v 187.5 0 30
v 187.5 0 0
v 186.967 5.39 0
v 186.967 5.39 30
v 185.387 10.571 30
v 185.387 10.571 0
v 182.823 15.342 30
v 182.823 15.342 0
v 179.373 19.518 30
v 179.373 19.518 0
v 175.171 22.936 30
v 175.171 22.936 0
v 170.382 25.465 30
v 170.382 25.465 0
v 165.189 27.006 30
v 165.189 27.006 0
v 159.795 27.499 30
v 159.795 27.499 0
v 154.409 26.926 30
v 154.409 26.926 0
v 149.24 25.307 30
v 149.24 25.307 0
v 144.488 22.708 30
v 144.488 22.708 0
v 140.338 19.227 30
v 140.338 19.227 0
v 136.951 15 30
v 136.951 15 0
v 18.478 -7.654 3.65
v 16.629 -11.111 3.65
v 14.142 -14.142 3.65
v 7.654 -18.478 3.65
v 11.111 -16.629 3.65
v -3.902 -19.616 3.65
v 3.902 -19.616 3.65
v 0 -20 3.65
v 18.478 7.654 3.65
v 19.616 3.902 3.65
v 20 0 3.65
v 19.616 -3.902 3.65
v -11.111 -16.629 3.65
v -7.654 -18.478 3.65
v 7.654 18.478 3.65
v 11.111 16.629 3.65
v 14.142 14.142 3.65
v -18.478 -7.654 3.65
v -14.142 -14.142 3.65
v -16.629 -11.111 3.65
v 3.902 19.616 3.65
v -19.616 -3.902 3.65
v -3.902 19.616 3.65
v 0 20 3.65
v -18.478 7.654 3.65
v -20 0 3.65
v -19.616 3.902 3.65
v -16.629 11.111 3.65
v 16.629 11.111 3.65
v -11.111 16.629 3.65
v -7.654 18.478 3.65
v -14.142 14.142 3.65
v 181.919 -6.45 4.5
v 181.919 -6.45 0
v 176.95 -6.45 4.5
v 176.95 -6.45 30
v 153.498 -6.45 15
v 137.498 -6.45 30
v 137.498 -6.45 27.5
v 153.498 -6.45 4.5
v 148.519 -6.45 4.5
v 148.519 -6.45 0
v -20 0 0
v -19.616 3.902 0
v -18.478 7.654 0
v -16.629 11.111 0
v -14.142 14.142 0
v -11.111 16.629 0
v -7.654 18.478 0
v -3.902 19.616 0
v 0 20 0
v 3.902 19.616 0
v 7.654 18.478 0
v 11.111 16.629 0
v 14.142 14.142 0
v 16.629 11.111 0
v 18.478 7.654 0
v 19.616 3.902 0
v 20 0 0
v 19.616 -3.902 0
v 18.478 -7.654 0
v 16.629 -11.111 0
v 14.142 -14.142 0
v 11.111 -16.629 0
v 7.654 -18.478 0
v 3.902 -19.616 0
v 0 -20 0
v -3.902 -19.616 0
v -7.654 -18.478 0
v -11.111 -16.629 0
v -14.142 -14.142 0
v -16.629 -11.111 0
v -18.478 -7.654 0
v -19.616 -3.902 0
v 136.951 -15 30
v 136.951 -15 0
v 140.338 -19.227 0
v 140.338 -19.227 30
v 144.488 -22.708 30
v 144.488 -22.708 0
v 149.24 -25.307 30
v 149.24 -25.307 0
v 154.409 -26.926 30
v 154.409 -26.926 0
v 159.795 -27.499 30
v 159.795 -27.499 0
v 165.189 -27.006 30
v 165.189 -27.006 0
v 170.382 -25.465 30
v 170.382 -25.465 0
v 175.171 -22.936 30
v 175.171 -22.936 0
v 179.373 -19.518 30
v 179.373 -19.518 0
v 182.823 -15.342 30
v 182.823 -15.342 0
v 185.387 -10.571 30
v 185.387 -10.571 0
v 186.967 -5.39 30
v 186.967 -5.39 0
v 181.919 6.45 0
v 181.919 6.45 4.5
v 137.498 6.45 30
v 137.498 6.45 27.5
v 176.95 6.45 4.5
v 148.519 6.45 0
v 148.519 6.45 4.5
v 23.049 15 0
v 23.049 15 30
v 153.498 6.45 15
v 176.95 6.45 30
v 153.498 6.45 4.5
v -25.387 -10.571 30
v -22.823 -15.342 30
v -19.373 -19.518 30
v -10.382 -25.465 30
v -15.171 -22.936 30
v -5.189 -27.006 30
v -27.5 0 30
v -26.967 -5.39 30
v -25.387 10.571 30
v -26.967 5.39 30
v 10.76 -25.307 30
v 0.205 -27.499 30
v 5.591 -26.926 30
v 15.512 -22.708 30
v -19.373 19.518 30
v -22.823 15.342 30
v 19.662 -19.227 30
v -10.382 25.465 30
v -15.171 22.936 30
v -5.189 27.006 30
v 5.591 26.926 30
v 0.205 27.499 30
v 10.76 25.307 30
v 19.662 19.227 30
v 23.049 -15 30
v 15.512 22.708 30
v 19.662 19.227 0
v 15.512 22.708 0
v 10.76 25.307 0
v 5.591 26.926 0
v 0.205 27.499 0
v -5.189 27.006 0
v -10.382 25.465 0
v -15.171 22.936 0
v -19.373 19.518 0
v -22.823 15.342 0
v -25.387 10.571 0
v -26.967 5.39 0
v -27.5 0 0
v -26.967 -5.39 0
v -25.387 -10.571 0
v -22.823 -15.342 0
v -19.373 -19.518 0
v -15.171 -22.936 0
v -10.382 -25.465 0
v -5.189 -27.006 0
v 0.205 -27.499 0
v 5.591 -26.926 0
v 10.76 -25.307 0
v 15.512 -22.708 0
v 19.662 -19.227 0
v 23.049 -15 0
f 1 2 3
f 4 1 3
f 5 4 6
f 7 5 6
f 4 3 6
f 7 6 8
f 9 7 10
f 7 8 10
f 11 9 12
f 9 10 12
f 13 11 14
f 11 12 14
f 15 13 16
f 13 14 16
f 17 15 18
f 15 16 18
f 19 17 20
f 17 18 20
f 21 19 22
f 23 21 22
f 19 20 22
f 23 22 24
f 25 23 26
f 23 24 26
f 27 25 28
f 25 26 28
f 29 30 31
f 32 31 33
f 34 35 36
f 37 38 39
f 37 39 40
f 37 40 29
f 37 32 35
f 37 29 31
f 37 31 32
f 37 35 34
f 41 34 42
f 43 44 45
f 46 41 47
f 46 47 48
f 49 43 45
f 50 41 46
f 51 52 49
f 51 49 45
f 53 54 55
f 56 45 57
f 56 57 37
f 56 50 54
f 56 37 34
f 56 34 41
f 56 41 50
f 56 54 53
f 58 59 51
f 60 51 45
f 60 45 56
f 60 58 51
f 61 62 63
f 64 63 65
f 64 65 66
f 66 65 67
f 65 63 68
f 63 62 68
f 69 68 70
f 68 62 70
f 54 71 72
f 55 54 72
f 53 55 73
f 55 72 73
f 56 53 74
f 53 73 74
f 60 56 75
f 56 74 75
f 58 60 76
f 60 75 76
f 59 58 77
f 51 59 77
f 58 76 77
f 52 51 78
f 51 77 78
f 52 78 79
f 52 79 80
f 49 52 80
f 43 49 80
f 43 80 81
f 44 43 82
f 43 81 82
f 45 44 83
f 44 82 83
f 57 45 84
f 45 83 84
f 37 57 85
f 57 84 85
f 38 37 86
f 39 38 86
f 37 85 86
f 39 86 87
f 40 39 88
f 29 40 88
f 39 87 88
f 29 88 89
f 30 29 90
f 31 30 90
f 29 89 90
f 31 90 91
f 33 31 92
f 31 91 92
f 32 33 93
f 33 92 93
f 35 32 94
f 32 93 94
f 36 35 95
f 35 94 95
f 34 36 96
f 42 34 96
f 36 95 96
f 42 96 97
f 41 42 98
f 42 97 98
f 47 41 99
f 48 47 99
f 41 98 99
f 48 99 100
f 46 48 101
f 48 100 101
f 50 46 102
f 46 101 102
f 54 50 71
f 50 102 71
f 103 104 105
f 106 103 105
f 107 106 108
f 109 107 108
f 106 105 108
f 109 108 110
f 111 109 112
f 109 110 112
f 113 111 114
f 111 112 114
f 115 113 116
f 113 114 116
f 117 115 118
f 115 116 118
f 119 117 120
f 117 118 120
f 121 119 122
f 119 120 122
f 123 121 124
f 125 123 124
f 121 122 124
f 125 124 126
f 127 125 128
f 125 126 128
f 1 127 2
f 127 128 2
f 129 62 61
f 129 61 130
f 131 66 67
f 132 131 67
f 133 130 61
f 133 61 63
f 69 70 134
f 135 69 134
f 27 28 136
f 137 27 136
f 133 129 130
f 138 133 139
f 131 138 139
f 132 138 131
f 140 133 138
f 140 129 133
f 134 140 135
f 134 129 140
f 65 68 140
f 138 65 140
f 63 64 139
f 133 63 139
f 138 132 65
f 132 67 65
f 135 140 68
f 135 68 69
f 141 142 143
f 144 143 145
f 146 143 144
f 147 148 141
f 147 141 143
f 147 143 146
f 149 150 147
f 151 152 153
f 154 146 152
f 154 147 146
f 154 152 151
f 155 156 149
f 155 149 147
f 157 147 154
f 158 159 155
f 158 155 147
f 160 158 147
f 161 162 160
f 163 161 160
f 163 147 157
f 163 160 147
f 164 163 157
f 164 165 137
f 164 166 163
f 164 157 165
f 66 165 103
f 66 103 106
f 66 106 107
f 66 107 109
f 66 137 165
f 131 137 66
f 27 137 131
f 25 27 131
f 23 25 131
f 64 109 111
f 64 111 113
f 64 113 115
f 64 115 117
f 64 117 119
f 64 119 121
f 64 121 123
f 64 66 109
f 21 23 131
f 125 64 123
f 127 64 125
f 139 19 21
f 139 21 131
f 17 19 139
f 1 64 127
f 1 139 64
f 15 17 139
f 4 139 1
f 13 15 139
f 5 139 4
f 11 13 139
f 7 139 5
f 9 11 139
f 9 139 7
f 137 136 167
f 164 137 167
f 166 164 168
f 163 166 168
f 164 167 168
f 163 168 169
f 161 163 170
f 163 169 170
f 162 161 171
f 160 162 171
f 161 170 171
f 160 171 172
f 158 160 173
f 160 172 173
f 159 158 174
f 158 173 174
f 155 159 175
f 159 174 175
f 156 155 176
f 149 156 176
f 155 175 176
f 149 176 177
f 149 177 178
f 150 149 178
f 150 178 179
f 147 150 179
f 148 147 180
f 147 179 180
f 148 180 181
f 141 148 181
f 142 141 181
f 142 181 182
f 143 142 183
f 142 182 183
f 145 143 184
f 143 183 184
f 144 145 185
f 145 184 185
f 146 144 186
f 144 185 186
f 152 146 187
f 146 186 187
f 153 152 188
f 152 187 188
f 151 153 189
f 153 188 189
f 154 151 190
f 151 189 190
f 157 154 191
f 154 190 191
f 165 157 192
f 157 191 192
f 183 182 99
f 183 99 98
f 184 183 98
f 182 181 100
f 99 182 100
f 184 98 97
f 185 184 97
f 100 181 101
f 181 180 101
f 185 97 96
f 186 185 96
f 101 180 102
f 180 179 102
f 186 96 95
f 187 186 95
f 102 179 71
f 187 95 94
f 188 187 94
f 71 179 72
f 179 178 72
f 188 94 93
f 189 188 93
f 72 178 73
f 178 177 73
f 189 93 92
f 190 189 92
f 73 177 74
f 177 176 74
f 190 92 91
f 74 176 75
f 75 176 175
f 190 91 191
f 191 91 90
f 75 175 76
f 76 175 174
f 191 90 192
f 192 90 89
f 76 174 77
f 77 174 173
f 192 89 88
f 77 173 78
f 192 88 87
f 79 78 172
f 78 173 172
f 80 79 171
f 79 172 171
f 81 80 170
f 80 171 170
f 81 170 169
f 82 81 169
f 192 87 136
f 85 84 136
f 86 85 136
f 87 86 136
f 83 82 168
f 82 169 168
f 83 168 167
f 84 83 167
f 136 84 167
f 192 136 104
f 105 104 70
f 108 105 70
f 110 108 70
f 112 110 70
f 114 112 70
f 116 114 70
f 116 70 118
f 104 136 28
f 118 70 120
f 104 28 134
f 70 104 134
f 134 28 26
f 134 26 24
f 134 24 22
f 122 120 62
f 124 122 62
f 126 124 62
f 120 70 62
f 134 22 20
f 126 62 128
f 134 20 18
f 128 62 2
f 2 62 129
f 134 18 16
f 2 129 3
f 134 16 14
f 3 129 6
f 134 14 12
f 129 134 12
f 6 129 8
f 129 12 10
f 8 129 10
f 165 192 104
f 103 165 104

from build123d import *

# Parameters (mm, degrees)
BOSS_EXTRUDE1_DEPTH = 30
SKETCH16_W          = 33.4
SKETCH16_H          = 12.9
CUT_EXTRUDE10_DEPTH = 4.5
SKETCH17_W          = 23.45208563
SKETCH17_H          = 12.9
CUT_EXTRUDE11_DEPTH = 192.865838543
CUT_EXTRUDE13_DEPTH = 6.45
SKETCH19_R          = 20
CUT_EXTRUDE14_DEPTH = 3.65


with BuildPart() as part:
    # Sketch1 → Boss-Extrude1 (new body)
    with BuildSketch(Plane.XY):
        with BuildLine():
            ThreePointArc((187.5, 0), (167.823244805, 26.363741023), (136.951138857, 15))
            Line((136.951138857, 15), (160, 15))
            Line((160, 15), (160, -15))
            Line((160, -15), (136.951138857, -15))
            ThreePointArc((136.951138857, -15), (167.823244805, -26.363741023), (187.5, 0))
        make_face()
        with BuildLine():
            Line((160, 15), (136.951138857, 15))
            ThreePointArc((136.951138857, 15), (132.5, 0), (136.951138857, -15))
            Line((136.951138857, -15), (160, -15))
            Line((160, -15), (160, 15))
        make_face()
        with BuildLine():
            Line((136.951138857, 15), (23.048861143, 15))
            ThreePointArc((23.048861143, 15), (26.363741023, 7.823244805), (27.5, 0))
            ThreePointArc((27.5, 0), (26.363741023, -7.823244805), (23.048861143, -15))
            Line((23.048861143, -15), (136.951138857, -15))
            ThreePointArc((136.951138857, -15), (132.5, 0), (136.951138857, 15))
        make_face()
        with BuildLine():
            ThreePointArc((13.228756555, -15), (-20, 0), (13.228756555, 15))
            Line((13.228756555, 15), (23.048861143, 15))
            ThreePointArc((23.048861143, 15), (-27.5, 0), (23.048861143, -15))
            Line((23.048861143, -15), (13.228756555, -15))
        make_face()
        with BuildLine():
            Line((23.048861143, 15), (13.228756555, 15))
            ThreePointArc((13.228756555, 15), (18.228756555, 8.228756555), (20, 0))
            ThreePointArc((20, 0), (18.228756555, -8.228756555), (13.228756555, -15))
            Line((13.228756555, -15), (23.048861143, -15))
            ThreePointArc((23.048861143, -15), (26.363741023, -7.823244805), (27.5, 0))
            ThreePointArc((27.5, 0), (26.363741023, 7.823244805), (23.048861143, 15))
        make_face()
        with BuildLine():
            Line((0, -15), (0, 15))
            Line((0, 15), (13.228756555, 15))
            ThreePointArc((13.228756555, 15), (-20, 0), (13.228756555, -15))
            Line((13.228756555, -15), (0, -15))
        make_face()
        with BuildLine():
            Line((13.228756555, 15), (0, 15))
            Line((0, 15), (0, -15))
            Line((0, -15), (13.228756555, -15))
            ThreePointArc((13.228756555, -15), (18.228756555, -8.228756555), (20, 0))
            ThreePointArc((20, 0), (18.228756555, 8.228756555), (13.228756555, 15))
        make_face()
    extrude(amount=BOSS_EXTRUDE1_DEPTH)

    # Sketch16 → Cut-Extrude10 (cut)
    with BuildSketch(Plane(origin=(0, 0, 0), x_dir=(-1, 0, 0), z_dir=(0, 0, -1))):
        with Locations((-165.21934279, 0)):
            Rectangle(SKETCH16_W, SKETCH16_H)
    extrude(amount=-CUT_EXTRUDE10_DEPTH, mode=Mode.SUBTRACT)

    # Sketch17 → Cut-Extrude11 (cut, through all)
    with BuildSketch(Plane(origin=(0, 0, 0), x_dir=(-1, 0, 0), z_dir=(0, 0, -1))):
        with Locations((-165.223957185, 0)):
            Rectangle(SKETCH17_W, SKETCH17_H)
    extrude(amount=-CUT_EXTRUDE11_DEPTH, mode=Mode.SUBTRACT)

    # Sketch18 → Cut-Extrude13 (cut, symmetric)
    with BuildSketch(Plane(origin=(0, 0, 0), x_dir=(-1, 0, 0), z_dir=(0, -1, 0))):
        Polygon((-153.49791437, -15), (-153.49791437, -30), (-137.49791437, -30), (-137.49791437, -27.5), align=None)
    extrude(amount=CUT_EXTRUDE13_DEPTH, both=True, mode=Mode.SUBTRACT)

    # Sketch19 → Cut-Extrude14 (cut, symmetric)
    with BuildSketch(Plane(origin=(0, 0, 0), x_dir=(-1, 0, 0), z_dir=(0, 0, -1))):
        Circle(SKETCH19_R)
    extrude(amount=CUT_EXTRUDE14_DEPTH, both=True, mode=Mode.SUBTRACT)


solid = part.part
